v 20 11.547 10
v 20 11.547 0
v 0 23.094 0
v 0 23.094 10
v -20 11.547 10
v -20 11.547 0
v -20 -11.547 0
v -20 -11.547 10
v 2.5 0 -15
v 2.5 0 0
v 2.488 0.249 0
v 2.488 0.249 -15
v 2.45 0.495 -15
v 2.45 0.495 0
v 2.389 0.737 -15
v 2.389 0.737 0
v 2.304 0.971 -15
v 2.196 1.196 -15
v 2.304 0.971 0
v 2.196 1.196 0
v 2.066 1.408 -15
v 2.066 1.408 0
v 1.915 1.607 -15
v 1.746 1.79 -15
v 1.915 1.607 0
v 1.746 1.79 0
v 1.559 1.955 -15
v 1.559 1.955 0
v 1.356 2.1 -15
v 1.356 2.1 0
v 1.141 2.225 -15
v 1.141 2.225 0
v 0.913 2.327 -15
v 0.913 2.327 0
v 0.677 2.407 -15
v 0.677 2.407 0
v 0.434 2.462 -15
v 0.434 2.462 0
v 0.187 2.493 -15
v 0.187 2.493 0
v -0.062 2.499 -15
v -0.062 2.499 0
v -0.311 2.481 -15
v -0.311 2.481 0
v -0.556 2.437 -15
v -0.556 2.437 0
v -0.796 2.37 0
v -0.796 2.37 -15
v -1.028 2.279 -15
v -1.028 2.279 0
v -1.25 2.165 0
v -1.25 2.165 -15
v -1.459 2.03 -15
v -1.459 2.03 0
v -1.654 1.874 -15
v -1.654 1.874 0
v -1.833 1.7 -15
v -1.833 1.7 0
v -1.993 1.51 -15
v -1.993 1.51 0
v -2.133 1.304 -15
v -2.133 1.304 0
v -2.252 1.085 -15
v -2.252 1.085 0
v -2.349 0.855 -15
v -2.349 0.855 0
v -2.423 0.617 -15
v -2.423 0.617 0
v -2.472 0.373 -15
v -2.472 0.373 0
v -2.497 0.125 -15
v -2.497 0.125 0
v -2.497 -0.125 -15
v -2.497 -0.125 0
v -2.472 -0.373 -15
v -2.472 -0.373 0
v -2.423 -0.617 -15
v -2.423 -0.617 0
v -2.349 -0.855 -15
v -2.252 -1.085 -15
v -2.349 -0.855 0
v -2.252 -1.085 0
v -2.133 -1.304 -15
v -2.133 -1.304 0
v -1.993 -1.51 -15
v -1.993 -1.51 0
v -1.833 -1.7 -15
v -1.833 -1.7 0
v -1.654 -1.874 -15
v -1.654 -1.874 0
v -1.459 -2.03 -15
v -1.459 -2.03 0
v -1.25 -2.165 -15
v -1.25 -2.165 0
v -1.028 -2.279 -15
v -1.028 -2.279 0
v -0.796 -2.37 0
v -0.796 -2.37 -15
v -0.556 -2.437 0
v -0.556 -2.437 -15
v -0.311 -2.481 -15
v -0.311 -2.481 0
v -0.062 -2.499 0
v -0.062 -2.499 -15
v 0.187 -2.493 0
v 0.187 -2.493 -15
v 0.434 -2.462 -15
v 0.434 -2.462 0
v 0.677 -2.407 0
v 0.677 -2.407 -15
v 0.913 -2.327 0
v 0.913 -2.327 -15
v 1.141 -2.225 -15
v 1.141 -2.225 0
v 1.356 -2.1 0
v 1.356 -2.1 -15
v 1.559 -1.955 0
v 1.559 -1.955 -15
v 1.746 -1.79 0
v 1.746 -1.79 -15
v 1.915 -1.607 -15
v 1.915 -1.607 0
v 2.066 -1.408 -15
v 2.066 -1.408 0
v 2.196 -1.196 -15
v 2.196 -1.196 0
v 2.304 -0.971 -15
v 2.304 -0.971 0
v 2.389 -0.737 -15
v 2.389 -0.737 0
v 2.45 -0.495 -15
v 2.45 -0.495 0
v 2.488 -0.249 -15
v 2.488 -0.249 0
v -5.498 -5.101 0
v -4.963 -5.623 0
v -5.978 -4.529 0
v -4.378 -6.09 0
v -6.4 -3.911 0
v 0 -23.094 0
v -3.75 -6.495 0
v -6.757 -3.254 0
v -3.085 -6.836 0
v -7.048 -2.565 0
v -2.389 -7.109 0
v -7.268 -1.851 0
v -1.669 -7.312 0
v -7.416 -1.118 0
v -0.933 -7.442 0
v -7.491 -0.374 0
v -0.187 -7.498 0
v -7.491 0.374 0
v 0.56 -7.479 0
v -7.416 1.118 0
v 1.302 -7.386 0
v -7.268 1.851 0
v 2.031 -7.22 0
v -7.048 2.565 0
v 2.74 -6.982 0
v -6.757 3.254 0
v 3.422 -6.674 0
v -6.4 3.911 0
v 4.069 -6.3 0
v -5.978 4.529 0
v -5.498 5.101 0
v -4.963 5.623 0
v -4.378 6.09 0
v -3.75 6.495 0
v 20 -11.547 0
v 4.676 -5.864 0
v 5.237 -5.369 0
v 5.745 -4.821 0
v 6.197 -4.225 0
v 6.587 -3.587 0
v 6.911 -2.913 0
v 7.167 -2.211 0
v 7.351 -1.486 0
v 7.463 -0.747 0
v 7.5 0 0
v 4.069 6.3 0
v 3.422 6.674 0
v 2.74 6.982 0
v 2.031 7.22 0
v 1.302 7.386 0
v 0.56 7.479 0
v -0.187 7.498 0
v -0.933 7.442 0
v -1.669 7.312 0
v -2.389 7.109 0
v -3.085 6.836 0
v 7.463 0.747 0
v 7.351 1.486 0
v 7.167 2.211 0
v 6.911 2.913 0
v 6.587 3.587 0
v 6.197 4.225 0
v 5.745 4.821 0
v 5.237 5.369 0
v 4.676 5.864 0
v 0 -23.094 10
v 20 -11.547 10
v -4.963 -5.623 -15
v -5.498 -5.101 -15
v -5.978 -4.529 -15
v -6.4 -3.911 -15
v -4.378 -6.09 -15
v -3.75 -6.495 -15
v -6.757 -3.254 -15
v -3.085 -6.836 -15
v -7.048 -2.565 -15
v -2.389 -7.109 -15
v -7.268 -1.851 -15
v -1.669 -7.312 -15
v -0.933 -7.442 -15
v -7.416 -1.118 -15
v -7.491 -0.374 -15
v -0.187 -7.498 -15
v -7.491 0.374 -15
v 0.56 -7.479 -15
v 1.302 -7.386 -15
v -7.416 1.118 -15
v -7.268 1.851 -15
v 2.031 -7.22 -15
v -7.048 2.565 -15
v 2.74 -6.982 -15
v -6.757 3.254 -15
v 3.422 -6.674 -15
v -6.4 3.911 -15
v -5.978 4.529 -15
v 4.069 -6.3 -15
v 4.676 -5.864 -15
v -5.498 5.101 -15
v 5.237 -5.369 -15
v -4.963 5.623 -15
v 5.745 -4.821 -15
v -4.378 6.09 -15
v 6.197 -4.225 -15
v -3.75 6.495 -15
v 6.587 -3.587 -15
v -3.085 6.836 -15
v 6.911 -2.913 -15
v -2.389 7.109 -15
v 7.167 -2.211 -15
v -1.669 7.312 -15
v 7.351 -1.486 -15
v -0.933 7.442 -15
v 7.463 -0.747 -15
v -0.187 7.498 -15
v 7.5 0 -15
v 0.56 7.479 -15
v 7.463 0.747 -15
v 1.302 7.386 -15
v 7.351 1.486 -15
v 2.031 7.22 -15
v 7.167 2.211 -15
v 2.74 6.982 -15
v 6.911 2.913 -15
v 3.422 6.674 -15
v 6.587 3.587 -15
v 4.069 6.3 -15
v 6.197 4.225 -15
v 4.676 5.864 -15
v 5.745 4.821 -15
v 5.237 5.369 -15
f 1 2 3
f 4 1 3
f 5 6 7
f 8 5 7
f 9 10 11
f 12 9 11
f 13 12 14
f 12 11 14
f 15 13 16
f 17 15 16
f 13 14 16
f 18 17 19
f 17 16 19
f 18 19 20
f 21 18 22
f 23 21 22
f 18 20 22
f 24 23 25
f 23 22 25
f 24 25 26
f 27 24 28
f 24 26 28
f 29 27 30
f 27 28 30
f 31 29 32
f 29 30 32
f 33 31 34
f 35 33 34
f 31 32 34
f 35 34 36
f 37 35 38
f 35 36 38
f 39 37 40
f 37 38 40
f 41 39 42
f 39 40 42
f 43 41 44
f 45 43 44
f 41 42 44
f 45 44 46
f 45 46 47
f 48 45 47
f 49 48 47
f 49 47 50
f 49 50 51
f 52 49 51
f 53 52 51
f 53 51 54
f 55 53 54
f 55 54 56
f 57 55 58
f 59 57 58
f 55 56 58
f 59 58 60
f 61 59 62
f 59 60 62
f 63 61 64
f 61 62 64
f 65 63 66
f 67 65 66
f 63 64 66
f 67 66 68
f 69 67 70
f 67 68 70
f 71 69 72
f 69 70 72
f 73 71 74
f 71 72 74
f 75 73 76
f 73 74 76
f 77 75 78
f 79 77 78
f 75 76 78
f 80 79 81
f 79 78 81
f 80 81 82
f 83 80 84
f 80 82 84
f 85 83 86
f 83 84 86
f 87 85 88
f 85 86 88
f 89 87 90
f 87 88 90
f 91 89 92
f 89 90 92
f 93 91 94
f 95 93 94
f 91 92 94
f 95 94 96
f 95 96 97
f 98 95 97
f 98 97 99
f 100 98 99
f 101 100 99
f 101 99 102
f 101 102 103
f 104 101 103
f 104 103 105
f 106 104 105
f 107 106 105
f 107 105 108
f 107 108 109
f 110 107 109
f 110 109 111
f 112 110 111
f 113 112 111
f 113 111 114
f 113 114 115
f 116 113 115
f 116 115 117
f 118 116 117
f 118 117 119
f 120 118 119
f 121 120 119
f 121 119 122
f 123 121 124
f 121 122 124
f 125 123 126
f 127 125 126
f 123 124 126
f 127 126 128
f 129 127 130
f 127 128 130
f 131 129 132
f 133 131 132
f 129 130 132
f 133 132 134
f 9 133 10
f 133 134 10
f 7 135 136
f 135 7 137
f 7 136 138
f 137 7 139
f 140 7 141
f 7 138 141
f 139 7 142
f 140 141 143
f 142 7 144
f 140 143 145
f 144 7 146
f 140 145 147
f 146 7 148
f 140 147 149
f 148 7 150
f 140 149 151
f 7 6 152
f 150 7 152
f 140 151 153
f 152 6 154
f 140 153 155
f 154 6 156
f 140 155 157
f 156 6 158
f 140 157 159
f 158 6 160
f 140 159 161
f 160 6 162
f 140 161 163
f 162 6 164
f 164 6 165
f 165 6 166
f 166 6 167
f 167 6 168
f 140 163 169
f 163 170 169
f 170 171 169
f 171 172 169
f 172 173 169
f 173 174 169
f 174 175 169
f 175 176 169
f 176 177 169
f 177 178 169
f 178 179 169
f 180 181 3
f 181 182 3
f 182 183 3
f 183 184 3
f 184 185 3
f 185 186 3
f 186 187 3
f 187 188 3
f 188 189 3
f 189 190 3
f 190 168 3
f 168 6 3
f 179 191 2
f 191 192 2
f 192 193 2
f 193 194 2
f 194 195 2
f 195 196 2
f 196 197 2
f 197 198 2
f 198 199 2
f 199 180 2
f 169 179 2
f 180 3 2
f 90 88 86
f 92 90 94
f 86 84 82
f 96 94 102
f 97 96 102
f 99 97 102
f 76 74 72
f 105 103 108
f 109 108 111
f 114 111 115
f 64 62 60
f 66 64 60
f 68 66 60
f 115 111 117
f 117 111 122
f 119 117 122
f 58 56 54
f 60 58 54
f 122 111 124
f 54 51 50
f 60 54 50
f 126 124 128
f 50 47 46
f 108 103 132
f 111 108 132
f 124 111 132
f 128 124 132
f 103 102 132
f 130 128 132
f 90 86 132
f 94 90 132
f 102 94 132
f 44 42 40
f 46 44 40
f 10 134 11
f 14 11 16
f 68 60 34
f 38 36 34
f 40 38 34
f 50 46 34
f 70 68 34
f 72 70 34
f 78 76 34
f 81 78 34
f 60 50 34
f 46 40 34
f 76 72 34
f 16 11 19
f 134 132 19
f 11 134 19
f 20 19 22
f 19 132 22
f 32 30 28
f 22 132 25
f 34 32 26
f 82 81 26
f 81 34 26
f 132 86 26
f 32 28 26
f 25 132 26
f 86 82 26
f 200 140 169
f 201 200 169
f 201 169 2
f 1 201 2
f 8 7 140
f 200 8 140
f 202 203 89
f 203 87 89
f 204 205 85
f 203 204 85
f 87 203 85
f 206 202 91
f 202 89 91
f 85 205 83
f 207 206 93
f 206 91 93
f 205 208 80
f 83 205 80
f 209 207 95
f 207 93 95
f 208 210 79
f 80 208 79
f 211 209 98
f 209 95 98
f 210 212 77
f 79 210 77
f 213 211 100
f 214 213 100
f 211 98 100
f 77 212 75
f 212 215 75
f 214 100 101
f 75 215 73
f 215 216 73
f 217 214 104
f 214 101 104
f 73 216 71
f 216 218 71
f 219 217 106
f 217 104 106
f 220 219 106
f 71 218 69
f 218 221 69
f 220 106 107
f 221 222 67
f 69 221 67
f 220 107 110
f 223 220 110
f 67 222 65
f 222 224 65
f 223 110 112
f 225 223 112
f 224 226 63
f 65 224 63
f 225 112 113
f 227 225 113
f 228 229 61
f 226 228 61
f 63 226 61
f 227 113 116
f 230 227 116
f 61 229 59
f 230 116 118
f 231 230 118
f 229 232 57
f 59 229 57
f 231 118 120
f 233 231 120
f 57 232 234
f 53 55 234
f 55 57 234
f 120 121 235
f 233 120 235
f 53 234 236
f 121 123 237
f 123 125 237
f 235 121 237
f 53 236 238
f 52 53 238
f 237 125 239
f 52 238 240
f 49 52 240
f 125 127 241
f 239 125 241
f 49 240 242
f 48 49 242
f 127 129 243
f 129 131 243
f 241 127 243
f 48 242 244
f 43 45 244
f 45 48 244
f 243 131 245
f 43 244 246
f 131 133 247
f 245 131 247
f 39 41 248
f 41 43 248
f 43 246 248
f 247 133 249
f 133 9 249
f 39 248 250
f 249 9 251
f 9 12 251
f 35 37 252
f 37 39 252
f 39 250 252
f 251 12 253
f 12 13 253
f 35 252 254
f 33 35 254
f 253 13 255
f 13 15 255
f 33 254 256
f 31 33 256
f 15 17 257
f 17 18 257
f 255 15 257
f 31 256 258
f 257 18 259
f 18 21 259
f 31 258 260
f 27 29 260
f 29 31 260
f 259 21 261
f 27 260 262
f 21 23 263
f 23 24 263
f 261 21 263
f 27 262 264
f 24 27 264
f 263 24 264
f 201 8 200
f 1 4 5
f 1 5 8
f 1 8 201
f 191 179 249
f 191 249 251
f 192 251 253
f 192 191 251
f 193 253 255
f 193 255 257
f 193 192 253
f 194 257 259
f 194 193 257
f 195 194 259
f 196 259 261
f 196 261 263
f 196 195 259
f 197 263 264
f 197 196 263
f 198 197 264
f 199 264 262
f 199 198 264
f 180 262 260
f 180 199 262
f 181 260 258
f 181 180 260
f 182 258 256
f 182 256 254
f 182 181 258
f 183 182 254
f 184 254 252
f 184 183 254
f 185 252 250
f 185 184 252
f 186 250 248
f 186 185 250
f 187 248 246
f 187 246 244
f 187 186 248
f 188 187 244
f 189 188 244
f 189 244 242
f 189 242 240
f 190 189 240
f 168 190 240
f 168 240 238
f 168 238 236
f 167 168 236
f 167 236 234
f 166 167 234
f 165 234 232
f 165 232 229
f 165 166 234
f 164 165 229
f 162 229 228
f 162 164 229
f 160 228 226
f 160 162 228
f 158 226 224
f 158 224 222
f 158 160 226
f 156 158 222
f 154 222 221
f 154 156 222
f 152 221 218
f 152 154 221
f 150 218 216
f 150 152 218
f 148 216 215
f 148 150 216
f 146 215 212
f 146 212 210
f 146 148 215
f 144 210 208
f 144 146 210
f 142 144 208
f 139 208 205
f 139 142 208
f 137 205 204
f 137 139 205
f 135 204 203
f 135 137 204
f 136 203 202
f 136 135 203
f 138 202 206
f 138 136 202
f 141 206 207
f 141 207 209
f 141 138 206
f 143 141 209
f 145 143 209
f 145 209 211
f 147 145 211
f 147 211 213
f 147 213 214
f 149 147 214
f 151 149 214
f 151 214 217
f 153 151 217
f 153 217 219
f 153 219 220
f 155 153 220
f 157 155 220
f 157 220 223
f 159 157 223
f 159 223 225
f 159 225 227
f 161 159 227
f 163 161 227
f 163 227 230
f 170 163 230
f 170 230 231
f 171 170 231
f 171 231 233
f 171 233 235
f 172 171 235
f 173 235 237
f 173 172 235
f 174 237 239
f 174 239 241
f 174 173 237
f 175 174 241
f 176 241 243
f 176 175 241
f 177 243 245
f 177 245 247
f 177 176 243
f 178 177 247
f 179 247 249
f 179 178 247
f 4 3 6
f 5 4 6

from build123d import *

# Parameters (mm, degrees)
SKETCH_R     = 7.5
SKETCH_R_2   = 2.5
PAD_DEPTH    = 15
PAD001_DEPTH = 10


with BuildPart() as part:
    # Sketch → Pad (new body)
    with BuildSketch(Plane.XY):
        Circle(SKETCH_R)
        Circle(SKETCH_R_2, mode=Mode.SUBTRACT)
    extrude(amount=-PAD_DEPTH)

    # Sketch001 → Pad001 (join)
    with BuildSketch(Plane.XY):
        Polygon((20, 11.547005), (0, 23.094011), (-20, 11.547005), (-20, -11.547005), (0, -23.094011), (20, -11.547005), align=None)
    extrude(amount=PAD001_DEPTH)


solid = part.part
